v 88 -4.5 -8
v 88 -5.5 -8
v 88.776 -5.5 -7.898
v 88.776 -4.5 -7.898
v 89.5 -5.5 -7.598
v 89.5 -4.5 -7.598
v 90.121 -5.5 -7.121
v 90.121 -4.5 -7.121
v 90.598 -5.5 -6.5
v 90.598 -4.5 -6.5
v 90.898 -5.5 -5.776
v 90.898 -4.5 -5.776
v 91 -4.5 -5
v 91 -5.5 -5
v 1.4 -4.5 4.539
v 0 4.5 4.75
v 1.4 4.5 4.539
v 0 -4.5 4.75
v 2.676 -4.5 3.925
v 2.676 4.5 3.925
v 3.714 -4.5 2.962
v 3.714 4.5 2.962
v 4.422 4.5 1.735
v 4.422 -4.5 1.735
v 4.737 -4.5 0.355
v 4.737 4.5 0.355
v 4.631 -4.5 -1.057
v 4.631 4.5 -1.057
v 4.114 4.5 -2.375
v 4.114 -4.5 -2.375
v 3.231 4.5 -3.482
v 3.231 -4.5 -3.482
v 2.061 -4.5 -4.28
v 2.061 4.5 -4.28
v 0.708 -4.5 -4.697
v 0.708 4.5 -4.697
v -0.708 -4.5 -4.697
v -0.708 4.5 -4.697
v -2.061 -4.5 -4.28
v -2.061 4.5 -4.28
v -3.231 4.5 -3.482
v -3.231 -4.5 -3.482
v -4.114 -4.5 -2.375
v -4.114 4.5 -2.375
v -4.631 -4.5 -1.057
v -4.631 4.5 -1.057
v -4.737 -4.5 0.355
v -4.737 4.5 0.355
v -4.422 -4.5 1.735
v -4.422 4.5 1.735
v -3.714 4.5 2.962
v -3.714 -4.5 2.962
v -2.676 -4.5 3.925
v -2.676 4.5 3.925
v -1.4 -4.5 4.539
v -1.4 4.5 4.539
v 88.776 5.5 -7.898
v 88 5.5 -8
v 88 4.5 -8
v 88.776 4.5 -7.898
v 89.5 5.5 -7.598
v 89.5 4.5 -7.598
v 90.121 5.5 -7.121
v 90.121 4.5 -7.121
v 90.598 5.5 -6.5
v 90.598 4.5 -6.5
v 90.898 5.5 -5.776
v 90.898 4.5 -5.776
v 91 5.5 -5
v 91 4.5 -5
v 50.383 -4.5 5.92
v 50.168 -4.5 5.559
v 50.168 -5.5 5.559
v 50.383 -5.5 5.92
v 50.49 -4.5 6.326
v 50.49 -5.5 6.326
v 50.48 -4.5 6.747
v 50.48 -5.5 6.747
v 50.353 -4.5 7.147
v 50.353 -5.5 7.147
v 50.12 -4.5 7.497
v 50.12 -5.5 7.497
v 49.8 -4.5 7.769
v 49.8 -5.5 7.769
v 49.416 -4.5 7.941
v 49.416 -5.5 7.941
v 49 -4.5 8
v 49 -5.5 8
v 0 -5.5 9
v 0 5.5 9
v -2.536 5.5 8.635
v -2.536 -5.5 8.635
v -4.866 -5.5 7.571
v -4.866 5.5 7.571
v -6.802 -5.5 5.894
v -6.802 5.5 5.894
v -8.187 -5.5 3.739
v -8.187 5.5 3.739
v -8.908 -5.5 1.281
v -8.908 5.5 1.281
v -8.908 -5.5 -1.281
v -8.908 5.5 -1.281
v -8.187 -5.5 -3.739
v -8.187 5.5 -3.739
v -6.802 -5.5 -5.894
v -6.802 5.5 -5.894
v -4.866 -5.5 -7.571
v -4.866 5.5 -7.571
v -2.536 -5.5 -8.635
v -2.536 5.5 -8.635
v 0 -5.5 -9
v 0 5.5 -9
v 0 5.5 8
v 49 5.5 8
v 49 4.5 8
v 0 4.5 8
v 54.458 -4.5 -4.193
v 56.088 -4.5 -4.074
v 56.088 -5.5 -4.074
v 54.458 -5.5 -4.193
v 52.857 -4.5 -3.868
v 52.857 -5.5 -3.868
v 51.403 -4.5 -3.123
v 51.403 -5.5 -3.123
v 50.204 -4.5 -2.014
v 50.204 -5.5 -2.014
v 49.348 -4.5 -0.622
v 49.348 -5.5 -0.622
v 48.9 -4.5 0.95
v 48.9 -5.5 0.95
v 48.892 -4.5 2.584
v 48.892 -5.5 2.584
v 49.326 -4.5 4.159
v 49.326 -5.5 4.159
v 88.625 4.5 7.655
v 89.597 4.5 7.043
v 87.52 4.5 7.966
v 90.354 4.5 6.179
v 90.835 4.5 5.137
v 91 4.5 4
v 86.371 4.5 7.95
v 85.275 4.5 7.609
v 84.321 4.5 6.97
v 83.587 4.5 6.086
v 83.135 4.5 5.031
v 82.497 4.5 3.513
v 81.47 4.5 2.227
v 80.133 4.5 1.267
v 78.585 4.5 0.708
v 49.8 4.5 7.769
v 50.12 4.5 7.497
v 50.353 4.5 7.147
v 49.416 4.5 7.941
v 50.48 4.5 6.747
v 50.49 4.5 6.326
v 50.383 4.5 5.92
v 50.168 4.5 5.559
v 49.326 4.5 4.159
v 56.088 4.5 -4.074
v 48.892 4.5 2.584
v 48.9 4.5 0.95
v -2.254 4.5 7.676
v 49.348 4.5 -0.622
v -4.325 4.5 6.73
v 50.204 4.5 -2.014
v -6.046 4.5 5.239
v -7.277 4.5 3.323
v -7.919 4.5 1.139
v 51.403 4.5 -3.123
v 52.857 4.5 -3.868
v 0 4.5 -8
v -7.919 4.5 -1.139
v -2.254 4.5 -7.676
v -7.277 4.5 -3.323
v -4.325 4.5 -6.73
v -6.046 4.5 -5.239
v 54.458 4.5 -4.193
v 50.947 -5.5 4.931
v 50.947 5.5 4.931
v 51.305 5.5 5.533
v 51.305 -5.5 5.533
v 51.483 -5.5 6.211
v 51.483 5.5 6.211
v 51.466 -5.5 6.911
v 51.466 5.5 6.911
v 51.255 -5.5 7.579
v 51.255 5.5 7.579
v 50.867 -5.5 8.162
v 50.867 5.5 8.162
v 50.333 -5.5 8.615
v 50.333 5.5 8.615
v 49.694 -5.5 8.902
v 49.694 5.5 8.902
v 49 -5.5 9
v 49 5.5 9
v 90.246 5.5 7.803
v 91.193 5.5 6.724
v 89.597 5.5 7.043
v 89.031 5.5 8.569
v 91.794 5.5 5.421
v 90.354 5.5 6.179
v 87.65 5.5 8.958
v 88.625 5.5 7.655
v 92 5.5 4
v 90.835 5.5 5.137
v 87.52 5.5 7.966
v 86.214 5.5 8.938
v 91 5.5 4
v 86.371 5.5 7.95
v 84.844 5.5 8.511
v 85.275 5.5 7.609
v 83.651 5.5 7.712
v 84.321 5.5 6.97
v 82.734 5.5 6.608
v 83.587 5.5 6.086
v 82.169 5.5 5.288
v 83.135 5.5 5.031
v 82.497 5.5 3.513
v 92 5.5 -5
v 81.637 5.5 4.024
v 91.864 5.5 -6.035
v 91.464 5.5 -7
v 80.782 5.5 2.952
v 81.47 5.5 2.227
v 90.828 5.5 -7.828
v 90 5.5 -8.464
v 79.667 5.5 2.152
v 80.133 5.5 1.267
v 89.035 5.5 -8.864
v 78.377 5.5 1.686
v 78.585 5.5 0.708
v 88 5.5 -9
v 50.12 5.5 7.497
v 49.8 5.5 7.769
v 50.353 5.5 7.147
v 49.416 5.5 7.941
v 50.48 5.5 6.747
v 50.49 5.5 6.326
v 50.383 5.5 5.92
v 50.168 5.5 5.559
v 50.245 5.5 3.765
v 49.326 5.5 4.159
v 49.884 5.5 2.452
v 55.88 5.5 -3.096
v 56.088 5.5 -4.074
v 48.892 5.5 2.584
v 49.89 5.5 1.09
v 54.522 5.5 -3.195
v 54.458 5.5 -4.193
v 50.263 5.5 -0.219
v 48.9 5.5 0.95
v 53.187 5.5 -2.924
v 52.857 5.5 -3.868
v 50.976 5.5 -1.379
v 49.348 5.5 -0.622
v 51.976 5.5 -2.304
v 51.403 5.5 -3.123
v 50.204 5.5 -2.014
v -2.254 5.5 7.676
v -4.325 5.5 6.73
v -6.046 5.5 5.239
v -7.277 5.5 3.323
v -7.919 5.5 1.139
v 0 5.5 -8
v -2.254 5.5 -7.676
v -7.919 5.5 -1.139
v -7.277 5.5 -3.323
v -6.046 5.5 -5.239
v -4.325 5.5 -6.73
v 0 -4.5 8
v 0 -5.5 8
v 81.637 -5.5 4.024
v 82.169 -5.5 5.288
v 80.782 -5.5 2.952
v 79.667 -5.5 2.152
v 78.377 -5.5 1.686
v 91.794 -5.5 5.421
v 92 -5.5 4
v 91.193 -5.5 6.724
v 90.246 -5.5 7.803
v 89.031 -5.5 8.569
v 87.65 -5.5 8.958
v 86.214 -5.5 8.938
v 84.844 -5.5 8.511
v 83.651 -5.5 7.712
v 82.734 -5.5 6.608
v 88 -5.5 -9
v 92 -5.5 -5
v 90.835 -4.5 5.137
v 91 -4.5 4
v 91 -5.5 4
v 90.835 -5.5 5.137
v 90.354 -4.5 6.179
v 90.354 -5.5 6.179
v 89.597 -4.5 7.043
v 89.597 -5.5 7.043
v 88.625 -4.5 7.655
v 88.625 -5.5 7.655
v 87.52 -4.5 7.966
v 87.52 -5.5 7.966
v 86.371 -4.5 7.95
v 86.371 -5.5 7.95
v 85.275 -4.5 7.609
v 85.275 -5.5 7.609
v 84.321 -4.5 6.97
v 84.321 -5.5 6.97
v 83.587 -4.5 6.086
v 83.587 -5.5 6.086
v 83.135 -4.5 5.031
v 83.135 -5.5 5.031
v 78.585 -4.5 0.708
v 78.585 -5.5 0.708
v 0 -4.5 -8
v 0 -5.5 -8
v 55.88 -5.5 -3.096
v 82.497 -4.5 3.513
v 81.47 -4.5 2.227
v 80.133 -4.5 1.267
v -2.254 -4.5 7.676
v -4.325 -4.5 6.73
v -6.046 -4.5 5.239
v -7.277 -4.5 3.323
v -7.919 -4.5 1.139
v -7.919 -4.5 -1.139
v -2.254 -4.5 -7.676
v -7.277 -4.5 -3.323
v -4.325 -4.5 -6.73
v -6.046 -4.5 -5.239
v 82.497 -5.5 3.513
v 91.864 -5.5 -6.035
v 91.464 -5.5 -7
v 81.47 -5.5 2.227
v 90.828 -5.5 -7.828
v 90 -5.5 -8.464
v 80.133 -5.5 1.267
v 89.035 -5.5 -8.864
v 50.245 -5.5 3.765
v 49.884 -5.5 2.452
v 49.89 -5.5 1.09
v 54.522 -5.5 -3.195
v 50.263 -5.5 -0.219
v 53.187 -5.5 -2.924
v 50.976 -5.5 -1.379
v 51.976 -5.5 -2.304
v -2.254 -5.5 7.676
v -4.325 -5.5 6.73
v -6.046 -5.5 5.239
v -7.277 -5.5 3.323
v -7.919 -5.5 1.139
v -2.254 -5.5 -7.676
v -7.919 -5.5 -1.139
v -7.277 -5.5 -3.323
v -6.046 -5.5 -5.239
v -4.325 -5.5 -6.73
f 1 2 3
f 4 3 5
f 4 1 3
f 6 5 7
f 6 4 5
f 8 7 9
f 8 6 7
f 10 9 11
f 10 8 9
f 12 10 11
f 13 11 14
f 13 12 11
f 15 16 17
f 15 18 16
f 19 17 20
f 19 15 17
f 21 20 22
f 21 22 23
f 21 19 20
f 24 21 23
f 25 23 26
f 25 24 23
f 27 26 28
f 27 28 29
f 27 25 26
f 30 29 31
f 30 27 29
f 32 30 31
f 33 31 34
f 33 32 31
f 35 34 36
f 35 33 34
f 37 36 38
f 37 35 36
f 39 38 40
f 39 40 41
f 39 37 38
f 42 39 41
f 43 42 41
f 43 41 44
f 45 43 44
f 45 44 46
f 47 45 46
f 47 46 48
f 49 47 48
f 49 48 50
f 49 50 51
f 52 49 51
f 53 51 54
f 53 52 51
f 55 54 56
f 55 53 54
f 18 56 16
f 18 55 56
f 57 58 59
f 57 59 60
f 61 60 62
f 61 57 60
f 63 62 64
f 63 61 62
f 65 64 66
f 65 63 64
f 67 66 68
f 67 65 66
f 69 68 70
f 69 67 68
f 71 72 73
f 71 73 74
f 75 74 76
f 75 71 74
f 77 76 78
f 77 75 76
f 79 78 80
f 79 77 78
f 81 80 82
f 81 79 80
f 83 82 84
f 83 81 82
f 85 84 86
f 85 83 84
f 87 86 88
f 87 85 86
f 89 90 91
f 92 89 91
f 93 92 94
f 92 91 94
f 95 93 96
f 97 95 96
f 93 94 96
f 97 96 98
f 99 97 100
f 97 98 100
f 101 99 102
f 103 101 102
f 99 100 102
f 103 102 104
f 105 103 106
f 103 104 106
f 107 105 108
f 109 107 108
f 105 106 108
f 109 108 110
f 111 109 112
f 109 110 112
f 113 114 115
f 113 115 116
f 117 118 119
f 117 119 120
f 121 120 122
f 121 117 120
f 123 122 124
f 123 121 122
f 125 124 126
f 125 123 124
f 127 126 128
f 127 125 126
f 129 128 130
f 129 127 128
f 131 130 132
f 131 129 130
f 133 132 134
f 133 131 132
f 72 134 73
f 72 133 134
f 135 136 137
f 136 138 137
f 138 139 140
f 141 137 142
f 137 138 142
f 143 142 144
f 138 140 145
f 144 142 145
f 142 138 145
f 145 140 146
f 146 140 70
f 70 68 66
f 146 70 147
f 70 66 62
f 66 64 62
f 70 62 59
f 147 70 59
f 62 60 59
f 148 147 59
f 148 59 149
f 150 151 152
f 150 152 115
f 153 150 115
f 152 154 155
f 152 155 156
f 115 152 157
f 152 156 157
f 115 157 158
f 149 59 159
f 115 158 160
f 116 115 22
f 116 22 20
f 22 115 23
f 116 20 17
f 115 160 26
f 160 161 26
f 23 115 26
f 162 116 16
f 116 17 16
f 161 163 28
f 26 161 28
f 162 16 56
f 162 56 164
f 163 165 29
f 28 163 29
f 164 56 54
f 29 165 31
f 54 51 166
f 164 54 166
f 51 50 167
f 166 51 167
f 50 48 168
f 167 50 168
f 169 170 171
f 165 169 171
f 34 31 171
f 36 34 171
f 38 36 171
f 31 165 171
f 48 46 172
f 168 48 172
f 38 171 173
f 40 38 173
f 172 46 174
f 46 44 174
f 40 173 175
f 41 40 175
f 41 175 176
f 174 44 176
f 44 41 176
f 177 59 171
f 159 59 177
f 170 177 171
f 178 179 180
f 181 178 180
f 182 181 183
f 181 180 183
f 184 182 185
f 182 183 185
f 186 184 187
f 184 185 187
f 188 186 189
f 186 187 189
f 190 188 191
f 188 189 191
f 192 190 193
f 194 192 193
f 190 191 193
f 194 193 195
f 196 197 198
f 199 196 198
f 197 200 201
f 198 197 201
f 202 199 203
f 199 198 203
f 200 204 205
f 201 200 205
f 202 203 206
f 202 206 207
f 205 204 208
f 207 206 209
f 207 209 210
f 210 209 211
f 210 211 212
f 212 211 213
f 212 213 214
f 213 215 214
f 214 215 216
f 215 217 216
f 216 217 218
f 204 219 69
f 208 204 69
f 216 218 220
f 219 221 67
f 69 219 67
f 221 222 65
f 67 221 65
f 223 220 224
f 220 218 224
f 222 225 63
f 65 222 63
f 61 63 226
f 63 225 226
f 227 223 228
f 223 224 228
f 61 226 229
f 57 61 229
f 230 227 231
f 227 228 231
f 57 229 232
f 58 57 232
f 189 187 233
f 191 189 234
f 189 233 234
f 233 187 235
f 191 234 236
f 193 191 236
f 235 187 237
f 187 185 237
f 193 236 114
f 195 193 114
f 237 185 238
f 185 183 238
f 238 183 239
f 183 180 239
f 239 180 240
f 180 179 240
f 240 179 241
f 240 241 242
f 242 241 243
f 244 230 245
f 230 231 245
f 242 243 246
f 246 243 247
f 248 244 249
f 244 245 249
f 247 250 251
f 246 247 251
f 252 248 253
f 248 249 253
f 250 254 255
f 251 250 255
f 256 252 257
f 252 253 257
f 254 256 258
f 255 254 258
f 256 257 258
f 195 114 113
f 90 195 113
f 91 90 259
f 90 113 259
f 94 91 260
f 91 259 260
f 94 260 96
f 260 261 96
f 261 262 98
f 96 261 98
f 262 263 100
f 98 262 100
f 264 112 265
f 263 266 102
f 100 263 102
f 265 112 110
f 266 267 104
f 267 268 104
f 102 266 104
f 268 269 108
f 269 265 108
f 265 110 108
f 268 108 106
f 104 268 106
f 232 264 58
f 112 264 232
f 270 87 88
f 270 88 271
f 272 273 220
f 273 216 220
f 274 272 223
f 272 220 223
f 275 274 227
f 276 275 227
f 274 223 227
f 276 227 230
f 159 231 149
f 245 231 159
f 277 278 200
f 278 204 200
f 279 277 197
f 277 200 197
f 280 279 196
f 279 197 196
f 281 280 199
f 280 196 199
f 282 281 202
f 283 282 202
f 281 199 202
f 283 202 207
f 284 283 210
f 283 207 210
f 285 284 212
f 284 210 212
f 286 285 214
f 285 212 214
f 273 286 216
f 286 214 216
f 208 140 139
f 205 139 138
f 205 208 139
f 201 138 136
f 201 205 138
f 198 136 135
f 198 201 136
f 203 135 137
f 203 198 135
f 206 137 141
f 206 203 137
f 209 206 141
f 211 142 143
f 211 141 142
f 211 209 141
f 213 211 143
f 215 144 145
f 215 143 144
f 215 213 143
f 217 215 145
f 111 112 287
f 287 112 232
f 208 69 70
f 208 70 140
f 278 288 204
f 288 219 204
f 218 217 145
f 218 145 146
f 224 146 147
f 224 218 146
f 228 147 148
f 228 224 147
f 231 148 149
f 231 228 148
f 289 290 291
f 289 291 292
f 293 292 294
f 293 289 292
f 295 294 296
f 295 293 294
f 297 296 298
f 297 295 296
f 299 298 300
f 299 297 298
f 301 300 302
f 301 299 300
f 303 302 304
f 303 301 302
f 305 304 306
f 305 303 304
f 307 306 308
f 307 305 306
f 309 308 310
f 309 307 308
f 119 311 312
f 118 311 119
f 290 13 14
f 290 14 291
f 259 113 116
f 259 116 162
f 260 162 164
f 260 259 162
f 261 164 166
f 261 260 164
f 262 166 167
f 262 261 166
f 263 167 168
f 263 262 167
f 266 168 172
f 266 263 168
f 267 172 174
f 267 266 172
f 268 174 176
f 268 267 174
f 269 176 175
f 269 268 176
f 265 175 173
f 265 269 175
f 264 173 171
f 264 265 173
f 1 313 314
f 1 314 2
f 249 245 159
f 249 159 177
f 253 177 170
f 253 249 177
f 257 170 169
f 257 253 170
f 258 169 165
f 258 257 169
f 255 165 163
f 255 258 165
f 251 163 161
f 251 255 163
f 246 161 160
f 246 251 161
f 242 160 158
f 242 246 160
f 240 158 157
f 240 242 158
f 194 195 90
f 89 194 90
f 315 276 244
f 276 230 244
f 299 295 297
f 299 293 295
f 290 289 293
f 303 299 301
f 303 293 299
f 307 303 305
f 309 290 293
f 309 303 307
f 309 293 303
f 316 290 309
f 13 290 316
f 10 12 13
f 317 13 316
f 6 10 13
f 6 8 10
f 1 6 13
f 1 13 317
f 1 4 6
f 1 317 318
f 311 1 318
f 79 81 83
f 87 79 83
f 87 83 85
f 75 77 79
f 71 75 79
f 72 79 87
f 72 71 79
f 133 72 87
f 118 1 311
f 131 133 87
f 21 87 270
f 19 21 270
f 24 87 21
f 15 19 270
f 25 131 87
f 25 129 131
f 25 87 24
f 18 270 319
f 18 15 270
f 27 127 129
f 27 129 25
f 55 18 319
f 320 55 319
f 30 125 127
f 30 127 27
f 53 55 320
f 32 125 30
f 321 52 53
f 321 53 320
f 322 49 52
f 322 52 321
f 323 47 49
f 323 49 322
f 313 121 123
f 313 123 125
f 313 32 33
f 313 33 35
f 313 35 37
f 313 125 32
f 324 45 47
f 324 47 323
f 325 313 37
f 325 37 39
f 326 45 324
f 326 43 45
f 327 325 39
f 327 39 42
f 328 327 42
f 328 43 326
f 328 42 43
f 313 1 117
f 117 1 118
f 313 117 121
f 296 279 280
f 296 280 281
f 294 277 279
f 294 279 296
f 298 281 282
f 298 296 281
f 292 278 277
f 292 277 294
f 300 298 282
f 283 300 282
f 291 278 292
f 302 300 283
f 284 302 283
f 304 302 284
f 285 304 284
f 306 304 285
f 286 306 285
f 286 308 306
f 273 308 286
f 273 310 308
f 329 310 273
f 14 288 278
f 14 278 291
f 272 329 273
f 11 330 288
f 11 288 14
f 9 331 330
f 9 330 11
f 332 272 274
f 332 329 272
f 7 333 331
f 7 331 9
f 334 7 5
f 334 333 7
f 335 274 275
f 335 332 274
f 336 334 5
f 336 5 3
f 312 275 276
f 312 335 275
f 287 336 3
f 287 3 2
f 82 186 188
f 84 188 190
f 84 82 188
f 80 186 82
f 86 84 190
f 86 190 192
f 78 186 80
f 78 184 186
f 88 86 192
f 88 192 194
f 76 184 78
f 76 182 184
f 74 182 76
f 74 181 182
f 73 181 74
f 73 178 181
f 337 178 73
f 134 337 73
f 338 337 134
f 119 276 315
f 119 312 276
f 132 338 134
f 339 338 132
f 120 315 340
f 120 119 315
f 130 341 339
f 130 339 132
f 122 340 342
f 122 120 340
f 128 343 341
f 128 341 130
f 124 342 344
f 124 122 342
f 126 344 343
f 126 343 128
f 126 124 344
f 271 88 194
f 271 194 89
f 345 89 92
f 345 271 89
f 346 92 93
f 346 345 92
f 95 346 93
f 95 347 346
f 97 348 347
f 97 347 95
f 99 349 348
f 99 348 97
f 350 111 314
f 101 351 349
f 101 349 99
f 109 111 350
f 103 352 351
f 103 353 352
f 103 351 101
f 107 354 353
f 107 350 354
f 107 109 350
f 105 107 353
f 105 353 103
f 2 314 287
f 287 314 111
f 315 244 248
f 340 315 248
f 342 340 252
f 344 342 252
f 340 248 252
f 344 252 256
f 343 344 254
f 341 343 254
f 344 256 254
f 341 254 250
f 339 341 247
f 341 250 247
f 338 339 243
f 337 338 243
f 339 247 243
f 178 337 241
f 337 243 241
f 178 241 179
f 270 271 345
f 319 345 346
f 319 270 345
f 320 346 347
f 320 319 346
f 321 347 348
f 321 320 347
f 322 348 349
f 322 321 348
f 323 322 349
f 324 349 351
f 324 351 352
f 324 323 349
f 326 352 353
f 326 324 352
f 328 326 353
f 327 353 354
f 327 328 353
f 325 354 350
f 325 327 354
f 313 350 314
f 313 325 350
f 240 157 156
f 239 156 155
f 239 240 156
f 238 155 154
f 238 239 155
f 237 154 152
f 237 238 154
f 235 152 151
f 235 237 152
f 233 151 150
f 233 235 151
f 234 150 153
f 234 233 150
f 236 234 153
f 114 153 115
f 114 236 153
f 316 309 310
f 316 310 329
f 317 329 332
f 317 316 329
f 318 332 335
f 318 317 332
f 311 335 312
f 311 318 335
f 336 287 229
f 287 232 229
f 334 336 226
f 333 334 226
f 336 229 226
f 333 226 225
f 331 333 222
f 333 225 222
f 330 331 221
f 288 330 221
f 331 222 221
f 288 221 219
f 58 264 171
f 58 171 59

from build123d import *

# Parameters (mm, degrees)
SKETCH2_R           = 4.75
BOSS_EXTRUDE1_DEPTH = 4.5
BOSS_EXTRUDE2_DEPTH = 5.5


with BuildPart() as part:
    # Sketch2 → Boss-Extrude1 (new, symmetric)
    with BuildSketch(Plane(origin=(0, 0, 0), x_dir=(1, 0, 0), z_dir=(0, 1, 0))):
        with BuildLine():
            Line((88, 9), (0, 9))
            ThreePointArc((0, 9), (-9, 0), (0, -9))
            Line((0, -9), (49, -9))
            ThreePointArc((49, -9), (51.255135572, -7.579056787), (50.946735477, -4.93149084))
            ThreePointArc((50.946735477, -4.93149084), (50.580227318, 0.823270393), (55.879764884, 3.096265482))
            Line((55.879764884, 3.096265482), (78.377159701, -1.685703406))
            ThreePointArc((78.377159701, -1.685703406), (80.781578904, -2.951663086), (82.168800624, -5.288220705))
            ThreePointArc((82.168800624, -5.288220705), (87.649616471, -8.95762024), (92, -4))
            Line((92, -4), (92, 5))
            ThreePointArc((92, 5), (90.828427125, 7.828427125), (88, 9))
        make_face()
        Circle(SKETCH2_R, mode=Mode.SUBTRACT)
    extrude(amount=BOSS_EXTRUDE1_DEPTH, both=True)

    # Sketch2<3> → Boss-Extrude2 (add, symmetric)
    with BuildSketch(Plane(origin=(0, 0, 0), x_dir=(1, 0, 0), z_dir=(0, 1, 0))):
        with BuildLine():
            Line((88, 9), (0, 9))
            ThreePointArc((0, 9), (-9, 0), (0, -9))
            Line((0, -9), (49, -9))
            ThreePointArc((49, -9), (51.255135572, -7.579056787), (50.946735477, -4.93149084))
            ThreePointArc((50.946735477, -4.93149084), (50.580227318, 0.823270393), (55.879764884, 3.096265482))
            Line((55.879764884, 3.096265482), (78.377159701, -1.685703406))
            ThreePointArc((78.377159701, -1.685703406), (80.781578904, -2.951663086), (82.168800624, -5.288220705))
            ThreePointArc((82.168800624, -5.288220705), (87.649616471, -8.95762024), (92, -4))
            Line((92, -4), (92, 5))
            ThreePointArc((92, 5), (90.828427125, 7.828427125), (88, 9))
        make_face()
        with BuildLine():
            ThreePointArc((0, -8), (-8, 0), (0, 8))
            Line((0, 8), (88, 8))
            ThreePointArc((88, 8), (90.121320344, 7.121320344), (91, 5))
            Line((91, 5), (91, -4))
            ThreePointArc((91, -4), (87.519693176, -7.966096192), (83.135040499, -5.030576564))
            ThreePointArc((83.135040499, -5.030576564), (81.470374435, -2.226707421), (78.585071392, -0.707555806))
            Line((78.585071392, -0.707555806), (56.087676575, 4.074413083))
            ThreePointArc((56.087676575, 4.074413083), (49.728231496, 1.346818976), (50.168041286, -5.558894504))
            ThreePointArc((50.168041286, -5.558894504), (50.353081343, -7.147434072), (49, -8))
            Line((49, -8), (0, -8))
        make_face(mode=Mode.SUBTRACT)
    extrude(amount=BOSS_EXTRUDE2_DEPTH, both=True)


solid = part.part
